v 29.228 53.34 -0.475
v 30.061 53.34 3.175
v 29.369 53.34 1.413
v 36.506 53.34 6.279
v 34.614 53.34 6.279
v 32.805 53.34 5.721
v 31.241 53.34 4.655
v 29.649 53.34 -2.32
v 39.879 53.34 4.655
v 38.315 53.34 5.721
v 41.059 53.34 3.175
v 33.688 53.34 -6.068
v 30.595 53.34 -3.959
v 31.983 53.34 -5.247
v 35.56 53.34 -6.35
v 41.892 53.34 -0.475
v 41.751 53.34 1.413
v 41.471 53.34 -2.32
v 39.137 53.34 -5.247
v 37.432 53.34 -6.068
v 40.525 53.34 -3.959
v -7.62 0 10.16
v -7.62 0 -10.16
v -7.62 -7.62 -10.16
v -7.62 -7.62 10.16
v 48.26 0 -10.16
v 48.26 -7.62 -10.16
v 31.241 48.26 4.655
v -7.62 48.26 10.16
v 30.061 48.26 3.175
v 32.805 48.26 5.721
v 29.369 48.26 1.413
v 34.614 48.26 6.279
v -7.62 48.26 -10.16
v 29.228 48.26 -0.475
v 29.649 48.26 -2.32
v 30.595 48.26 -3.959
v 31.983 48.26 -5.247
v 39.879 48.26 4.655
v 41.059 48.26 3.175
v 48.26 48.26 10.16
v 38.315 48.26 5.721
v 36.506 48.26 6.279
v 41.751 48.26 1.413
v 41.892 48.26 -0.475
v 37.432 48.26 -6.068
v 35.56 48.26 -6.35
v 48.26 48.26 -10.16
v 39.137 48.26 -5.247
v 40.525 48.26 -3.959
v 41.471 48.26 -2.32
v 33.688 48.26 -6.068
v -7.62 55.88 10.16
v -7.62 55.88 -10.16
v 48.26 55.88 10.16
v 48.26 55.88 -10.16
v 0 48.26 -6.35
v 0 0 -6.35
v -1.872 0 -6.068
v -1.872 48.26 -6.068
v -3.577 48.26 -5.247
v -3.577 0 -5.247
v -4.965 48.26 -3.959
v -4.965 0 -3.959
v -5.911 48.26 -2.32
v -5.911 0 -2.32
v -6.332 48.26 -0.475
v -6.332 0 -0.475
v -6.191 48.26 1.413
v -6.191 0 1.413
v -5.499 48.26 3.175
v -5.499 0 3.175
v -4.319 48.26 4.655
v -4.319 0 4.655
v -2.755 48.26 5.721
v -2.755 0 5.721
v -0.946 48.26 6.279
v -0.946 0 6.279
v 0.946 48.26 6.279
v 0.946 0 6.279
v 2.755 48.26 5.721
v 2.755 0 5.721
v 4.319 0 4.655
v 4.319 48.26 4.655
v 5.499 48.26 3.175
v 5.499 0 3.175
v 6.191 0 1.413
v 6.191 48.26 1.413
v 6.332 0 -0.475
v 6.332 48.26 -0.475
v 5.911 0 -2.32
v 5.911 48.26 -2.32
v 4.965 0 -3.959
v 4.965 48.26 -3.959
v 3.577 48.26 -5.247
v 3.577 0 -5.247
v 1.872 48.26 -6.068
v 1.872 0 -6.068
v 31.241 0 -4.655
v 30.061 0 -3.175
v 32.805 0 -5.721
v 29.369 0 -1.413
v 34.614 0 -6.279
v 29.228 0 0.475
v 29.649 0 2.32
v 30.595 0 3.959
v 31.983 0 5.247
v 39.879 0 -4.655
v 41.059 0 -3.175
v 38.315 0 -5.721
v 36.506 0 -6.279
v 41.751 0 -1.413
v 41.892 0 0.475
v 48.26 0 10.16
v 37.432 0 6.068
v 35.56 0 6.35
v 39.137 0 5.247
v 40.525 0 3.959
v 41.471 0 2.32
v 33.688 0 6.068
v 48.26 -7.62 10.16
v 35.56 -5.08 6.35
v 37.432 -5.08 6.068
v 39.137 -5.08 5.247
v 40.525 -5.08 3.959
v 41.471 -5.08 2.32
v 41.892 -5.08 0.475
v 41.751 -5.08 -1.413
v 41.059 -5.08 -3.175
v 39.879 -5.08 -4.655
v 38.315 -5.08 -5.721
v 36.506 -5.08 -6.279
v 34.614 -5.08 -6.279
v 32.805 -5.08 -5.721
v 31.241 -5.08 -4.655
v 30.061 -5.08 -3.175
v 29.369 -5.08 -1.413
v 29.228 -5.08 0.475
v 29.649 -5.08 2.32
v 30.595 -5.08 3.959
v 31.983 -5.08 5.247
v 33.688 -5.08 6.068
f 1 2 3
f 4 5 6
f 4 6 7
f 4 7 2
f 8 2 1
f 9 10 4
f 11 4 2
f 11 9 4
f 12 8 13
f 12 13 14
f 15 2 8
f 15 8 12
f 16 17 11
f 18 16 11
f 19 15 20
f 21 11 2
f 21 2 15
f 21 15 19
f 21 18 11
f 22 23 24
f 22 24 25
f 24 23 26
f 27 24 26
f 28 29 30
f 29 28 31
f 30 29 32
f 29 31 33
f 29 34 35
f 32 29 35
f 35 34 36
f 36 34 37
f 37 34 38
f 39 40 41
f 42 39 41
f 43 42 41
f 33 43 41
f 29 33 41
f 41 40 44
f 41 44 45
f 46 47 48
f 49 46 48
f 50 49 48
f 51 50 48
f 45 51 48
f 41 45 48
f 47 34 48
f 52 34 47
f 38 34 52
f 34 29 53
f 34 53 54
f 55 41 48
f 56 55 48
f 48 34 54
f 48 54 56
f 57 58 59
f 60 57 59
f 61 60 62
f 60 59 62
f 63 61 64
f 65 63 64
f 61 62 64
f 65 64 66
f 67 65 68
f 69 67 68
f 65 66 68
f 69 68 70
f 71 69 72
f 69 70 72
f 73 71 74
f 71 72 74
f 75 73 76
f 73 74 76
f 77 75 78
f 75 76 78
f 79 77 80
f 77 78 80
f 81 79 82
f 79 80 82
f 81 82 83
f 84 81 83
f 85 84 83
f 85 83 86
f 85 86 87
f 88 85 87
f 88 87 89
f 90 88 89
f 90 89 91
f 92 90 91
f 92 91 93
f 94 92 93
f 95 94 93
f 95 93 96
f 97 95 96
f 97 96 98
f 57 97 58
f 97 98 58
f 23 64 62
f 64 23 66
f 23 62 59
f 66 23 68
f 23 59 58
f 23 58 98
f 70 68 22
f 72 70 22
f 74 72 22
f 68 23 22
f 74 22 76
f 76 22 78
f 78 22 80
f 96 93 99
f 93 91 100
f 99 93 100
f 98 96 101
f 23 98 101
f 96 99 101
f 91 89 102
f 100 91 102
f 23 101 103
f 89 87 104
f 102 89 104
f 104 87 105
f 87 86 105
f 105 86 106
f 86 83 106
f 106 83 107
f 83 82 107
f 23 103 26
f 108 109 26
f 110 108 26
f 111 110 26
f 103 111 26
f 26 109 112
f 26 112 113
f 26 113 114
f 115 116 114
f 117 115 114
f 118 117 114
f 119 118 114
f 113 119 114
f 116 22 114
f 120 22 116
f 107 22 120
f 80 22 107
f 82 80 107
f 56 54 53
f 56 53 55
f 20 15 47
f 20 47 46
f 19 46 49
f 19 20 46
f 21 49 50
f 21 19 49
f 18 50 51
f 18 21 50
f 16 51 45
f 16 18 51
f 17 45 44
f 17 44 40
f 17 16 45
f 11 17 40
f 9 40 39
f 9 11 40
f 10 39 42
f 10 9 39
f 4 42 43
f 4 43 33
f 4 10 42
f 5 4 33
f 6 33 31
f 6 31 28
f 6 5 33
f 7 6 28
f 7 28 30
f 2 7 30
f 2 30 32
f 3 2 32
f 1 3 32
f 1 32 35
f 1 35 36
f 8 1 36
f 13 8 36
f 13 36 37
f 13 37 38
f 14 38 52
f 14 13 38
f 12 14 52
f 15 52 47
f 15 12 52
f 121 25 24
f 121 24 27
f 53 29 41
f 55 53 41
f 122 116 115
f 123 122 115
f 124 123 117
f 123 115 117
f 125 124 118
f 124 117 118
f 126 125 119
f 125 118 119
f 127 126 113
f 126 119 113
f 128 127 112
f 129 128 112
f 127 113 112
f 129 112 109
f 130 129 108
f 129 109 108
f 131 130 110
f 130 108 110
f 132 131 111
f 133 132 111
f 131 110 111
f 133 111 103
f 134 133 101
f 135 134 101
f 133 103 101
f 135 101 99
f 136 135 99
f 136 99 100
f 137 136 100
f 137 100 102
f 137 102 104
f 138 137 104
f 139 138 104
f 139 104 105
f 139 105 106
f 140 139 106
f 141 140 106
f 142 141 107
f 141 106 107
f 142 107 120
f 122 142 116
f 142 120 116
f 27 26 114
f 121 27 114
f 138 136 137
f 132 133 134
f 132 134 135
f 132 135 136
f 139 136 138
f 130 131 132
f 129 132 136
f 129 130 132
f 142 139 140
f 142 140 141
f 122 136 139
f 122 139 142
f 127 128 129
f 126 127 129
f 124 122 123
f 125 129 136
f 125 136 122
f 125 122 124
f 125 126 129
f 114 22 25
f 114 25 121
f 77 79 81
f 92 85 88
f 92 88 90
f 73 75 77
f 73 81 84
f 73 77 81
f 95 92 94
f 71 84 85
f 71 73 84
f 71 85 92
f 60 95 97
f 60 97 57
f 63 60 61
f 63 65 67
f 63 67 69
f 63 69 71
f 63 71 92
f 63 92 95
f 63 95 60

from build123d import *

# Parameters (mm, degrees)
SKETCH1_R           = 6.35
BOSS_EXTRUDE1_DEPTH = 48.26
SKETCH2_W           = 55.88
SKETCH2_H           = 20.32
BOSS_EXTRUDE2_DEPTH = 7.62
SKETCH3_W           = 55.88
SKETCH3_H           = 20.32
BOSS_EXTRUDE3_DEPTH = 7.62
SKETCH5_R           = 6.35
CUT_EXTRUDE1_DEPTH  = 5.08
CUT_EXTRUDE2_START  = -5.08
SKETCH6_R           = 6.35
CUT_EXTRUDE2_DEPTH  = 5.08


with BuildPart() as part:
    # Sketch1 → Boss-Extrude1 (new body)
    with BuildSketch(Plane(origin=(0, 0, 0), x_dir=(1, 0, 0), z_dir=(0, 1, 0))):
        with Locations(Location((0, 0, 0), (0, 0, 90))):
            Circle(SKETCH1_R)
    extrude(amount=BOSS_EXTRUDE1_DEPTH)

    # Sketch3 → Boss-Extrude3 (add)
    with BuildSketch(Plane.XZ):
        with Locations((20.32, 0)):
            Rectangle(SKETCH3_W, SKETCH3_H)
    extrude(amount=BOSS_EXTRUDE3_DEPTH)

    # Sketch5 → Cut-Extrude1 (cut)
    with BuildSketch(Plane(origin=(0, 0, 0), x_dir=(1, 0, 0), z_dir=(0, 1, 0))):
        with Locations(Location((35.56, 0, 0), (0, 0, 270))):
            Circle(SKETCH5_R)
    extrude(amount=-CUT_EXTRUDE1_DEPTH, mode=Mode.SUBTRACT)


with BuildPart() as body_2:
    # Sketch2 → Boss-Extrude2 (new body)
    with BuildSketch(Plane(origin=(0, 48.26, 0), x_dir=(1, 0, 0), z_dir=(0, 1, 0))):
        with Locations((20.32, 0)):
            Rectangle(SKETCH2_W, SKETCH2_H)
    extrude(amount=BOSS_EXTRUDE2_DEPTH)

    # Sketch6 → Cut-Extrude2 (cut)
    with BuildSketch(Plane.XZ.offset(-48.26).offset(CUT_EXTRUDE2_START)):
        with Locations(Location((35.56, 0, 0), (0, 0, 270))):
            Circle(SKETCH6_R)
    extrude(amount=CUT_EXTRUDE2_DEPTH, mode=Mode.SUBTRACT)


solid = Compound([part.part, body_2.part])
